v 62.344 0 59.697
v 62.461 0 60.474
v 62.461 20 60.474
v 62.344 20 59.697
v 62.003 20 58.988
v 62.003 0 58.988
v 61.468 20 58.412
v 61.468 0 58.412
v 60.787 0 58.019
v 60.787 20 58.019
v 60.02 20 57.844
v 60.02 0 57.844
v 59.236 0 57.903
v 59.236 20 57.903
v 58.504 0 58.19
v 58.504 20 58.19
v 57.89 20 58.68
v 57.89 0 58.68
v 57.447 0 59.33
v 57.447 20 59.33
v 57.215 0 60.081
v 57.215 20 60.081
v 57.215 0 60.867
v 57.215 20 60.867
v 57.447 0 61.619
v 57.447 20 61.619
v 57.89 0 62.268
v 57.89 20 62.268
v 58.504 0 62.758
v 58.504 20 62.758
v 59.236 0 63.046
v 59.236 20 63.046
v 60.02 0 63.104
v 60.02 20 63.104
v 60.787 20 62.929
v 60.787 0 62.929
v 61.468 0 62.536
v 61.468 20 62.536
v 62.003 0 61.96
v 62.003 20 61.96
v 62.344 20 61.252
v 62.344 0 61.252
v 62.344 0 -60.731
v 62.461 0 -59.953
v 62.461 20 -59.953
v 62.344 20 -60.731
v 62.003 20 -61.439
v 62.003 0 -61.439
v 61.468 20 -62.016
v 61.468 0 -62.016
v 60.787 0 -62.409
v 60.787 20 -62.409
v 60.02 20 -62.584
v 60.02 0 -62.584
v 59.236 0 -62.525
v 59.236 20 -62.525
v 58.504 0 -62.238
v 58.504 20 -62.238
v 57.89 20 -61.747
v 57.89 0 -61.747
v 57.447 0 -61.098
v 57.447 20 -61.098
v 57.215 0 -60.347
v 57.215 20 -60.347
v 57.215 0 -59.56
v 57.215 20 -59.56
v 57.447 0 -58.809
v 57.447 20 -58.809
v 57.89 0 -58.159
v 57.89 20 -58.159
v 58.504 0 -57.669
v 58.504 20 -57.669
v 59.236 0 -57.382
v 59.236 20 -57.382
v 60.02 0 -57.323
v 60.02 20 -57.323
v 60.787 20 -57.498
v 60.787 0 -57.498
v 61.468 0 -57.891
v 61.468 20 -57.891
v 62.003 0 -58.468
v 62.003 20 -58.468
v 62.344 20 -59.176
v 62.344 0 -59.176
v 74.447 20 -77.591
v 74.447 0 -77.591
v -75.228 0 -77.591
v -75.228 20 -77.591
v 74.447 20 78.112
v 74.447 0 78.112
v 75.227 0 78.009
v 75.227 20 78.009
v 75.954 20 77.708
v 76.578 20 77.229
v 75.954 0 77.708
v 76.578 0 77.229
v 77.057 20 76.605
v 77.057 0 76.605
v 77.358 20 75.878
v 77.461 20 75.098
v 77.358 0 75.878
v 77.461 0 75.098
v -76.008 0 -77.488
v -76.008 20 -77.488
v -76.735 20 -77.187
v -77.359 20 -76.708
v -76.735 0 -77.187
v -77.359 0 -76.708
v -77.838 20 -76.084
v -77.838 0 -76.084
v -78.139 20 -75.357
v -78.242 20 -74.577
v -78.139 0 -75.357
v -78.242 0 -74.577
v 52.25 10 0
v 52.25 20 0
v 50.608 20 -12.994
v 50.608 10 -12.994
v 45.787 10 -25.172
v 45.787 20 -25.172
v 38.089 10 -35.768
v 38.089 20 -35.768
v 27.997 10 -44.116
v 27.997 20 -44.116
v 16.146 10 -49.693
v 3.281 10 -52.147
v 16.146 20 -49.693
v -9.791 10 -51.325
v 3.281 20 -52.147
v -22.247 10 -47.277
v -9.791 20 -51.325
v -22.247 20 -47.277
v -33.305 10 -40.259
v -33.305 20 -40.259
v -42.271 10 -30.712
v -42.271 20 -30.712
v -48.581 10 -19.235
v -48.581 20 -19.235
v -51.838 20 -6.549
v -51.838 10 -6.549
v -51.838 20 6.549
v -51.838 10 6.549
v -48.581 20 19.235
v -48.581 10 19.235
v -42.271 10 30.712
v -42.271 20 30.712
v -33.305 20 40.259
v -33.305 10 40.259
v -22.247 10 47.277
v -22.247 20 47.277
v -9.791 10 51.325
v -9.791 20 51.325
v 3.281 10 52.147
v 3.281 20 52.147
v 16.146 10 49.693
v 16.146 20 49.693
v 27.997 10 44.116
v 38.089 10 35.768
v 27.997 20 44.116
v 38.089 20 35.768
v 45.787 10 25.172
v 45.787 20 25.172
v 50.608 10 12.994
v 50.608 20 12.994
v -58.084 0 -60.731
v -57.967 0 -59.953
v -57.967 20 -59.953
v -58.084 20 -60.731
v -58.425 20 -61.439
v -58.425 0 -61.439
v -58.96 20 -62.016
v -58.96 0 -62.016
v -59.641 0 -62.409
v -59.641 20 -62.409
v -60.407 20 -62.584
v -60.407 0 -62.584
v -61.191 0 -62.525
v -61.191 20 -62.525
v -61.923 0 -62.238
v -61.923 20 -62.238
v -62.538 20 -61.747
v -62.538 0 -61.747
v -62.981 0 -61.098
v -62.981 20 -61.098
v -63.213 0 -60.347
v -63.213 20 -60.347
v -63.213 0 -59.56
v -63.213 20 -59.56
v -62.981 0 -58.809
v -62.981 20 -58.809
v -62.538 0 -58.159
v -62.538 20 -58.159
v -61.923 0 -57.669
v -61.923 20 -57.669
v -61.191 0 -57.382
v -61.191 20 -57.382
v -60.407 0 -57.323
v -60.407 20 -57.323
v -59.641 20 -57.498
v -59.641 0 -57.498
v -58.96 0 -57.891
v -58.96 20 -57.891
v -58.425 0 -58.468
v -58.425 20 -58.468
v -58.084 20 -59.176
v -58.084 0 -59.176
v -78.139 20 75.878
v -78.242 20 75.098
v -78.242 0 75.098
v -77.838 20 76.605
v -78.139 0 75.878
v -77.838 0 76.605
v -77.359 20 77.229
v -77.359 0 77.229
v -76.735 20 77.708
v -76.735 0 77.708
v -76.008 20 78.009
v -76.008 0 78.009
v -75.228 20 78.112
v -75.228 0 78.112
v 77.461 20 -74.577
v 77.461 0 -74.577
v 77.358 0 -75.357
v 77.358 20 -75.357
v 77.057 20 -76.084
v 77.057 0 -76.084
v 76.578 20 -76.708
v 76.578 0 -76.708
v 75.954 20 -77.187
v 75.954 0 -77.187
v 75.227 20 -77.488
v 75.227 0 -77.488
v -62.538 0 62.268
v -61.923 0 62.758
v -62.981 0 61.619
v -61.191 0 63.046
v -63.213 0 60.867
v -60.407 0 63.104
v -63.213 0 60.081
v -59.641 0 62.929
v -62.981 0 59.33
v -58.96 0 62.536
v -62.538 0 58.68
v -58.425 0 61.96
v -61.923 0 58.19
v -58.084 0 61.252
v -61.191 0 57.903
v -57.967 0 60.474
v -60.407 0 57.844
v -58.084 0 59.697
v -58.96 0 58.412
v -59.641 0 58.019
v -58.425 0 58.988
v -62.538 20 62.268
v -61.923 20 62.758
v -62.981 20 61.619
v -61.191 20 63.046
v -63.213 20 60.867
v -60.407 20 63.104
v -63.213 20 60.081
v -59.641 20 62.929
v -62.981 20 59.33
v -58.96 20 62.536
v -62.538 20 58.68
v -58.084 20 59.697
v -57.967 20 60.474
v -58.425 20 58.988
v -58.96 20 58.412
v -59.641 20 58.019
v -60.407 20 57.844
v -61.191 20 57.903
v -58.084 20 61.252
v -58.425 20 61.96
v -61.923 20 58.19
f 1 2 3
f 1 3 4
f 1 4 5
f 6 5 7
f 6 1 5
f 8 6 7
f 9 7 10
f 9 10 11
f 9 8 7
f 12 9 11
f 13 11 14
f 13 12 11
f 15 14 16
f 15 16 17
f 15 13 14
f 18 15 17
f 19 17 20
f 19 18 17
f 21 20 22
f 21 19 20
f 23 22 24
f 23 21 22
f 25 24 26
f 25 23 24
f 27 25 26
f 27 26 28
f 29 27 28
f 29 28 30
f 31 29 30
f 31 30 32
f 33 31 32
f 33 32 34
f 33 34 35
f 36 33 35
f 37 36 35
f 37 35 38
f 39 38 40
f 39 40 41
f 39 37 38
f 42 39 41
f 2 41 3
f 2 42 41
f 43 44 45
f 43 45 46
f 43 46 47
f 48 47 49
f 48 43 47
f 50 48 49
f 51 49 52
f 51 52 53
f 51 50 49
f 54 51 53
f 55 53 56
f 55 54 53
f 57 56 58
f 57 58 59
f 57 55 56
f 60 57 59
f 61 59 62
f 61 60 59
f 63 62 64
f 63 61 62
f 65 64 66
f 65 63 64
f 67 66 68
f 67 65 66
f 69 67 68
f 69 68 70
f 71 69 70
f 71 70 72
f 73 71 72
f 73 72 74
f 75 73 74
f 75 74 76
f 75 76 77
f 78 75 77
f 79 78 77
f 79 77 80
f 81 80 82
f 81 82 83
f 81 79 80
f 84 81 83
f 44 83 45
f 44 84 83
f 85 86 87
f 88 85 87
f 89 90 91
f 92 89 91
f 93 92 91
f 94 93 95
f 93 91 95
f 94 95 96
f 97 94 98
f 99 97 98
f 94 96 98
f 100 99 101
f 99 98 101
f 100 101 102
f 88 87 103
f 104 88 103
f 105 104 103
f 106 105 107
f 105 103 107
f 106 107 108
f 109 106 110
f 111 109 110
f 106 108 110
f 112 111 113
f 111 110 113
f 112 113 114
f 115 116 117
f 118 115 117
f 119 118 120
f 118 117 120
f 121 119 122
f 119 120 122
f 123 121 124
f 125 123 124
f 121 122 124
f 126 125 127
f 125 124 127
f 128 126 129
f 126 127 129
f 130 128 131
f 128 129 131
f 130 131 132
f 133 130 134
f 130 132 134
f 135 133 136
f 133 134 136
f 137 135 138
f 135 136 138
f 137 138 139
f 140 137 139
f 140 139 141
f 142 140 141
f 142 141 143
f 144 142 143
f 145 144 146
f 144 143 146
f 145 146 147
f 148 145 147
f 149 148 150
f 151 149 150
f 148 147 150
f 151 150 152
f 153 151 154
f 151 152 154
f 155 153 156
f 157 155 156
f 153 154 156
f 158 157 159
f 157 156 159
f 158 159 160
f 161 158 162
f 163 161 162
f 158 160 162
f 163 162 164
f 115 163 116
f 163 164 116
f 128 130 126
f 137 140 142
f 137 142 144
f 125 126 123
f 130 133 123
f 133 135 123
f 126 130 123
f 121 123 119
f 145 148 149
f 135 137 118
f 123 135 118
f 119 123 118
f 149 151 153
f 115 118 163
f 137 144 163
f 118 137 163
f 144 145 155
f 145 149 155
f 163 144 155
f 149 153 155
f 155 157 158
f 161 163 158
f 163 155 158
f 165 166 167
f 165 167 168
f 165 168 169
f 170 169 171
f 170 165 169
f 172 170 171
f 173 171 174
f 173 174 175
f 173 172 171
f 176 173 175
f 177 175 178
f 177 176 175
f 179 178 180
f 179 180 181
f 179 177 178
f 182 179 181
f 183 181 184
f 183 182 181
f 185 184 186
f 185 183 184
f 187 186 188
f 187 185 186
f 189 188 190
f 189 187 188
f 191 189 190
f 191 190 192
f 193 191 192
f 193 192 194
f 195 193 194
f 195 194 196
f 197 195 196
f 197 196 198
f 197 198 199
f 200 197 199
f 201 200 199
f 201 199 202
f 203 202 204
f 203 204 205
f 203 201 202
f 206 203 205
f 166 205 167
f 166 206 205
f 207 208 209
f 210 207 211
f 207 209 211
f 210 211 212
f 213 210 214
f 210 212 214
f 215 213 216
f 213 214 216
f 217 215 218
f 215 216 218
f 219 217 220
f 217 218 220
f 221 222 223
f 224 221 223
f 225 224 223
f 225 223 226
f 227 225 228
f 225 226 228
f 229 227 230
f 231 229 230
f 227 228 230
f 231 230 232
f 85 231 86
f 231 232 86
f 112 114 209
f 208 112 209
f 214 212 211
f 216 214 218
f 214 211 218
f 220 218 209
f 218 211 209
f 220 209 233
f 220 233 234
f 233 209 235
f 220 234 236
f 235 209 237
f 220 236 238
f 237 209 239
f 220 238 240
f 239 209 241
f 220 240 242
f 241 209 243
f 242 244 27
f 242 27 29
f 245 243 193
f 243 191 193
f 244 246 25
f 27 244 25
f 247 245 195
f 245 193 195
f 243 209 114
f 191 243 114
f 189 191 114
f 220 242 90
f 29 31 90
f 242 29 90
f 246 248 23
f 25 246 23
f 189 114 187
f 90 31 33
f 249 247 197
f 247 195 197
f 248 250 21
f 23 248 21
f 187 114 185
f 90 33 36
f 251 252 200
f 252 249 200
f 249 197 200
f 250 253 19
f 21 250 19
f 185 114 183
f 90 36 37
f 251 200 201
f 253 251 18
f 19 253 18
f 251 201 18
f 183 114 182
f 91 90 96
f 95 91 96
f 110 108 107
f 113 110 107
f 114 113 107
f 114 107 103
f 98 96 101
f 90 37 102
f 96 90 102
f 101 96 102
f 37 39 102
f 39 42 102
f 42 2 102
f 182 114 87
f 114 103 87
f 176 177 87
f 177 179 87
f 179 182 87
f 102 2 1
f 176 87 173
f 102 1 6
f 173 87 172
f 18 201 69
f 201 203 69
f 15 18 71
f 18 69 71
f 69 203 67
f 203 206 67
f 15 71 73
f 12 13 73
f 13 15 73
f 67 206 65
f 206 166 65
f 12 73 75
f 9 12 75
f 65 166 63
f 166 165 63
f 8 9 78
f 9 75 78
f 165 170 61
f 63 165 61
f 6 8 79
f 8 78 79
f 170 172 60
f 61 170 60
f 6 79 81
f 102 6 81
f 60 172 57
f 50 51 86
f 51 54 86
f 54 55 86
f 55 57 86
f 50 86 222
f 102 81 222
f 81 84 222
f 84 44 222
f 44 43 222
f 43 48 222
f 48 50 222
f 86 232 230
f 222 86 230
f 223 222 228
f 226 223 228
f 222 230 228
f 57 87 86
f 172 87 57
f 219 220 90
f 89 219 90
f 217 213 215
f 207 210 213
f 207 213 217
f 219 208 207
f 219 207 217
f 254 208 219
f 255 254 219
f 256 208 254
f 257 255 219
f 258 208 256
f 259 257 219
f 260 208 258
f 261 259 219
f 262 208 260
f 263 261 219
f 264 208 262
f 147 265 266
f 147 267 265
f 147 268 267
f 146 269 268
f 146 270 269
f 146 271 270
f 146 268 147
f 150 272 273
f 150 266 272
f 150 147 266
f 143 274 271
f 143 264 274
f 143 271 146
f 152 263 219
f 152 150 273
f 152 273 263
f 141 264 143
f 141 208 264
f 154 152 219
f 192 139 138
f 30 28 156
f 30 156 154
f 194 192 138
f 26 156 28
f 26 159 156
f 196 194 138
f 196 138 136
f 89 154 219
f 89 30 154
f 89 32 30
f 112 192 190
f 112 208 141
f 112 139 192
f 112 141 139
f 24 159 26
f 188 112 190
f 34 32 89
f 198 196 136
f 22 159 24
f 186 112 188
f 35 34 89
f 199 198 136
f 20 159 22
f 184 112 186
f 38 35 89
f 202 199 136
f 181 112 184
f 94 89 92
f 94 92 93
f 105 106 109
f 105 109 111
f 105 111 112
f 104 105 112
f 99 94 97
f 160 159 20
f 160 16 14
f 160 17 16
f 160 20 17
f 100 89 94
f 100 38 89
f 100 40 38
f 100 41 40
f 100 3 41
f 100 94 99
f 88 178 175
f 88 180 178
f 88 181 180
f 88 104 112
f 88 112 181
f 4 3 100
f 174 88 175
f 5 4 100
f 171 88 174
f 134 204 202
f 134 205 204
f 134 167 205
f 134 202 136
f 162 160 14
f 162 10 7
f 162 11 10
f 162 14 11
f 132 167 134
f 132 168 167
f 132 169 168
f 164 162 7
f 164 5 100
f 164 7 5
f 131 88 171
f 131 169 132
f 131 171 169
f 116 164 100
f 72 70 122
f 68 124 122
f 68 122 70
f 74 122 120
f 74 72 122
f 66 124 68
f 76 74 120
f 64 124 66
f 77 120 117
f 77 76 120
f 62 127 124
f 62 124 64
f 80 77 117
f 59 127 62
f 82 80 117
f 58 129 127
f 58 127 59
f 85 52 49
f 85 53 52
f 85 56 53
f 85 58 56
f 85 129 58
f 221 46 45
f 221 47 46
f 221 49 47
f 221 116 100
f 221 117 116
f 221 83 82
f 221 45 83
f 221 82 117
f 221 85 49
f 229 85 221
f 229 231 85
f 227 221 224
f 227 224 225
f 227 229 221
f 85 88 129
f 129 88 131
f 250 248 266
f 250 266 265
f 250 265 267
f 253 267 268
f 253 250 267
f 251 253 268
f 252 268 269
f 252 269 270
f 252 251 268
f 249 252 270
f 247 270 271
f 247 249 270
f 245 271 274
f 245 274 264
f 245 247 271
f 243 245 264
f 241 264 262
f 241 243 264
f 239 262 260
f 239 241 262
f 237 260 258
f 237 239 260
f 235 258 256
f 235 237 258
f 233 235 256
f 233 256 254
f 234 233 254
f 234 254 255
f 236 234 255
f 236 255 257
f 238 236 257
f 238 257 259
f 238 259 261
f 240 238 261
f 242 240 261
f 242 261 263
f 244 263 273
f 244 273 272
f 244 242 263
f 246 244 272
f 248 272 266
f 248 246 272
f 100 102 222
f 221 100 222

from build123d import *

# Parameters (mm, degrees)
SKETCH1_R           = 2.637642313
SKETCH1_R_2         = 73
BOSS_EXTRUDE1_DEPTH = 20
SKETCH4_R           = 73
SKETCH4_R_2         = 52.25
BOSS_EXTRUDE2_DEPTH = 10
SKETCH5_R           = 73
BOSS_EXTRUDE3_DEPTH = 10


with BuildPart() as part:
    # Sketch1 → Boss-Extrude1 (new body)
    with BuildSketch(Plane(origin=(0, 0, 0), x_dir=(1, 0, 0), z_dir=(0, 1, 0))):
        with BuildLine():
            Line((77.460838348, -75.098177713), (77.460838348, 74.577424045))
            ThreePointArc((77.460838348, 74.577424045), (76.578174547, 76.708362964), (74.447235628, 77.591026765))
            Line((74.447235628, 77.591026765), (-75.22836613, 77.591026765))
            ThreePointArc((-75.22836613, 77.591026765), (-77.359305049, 76.708362964), (-78.24196885, 74.577424045))
            Line((-78.24196885, 74.577424045), (-78.24196885, -75.098177713))
            ThreePointArc((-78.24196885, -75.098177713), (-77.359305049, -77.229116632), (-75.22836613, -78.111780433))
            Line((-75.22836613, -78.111780433), (74.447235628, -78.111780433))
            ThreePointArc((74.447235628, -78.111780433), (76.578174547, -77.229116632), (77.460838348, -75.098177713))
        make_face()
        with Locations((-60.604326536, -60.47413812)):
            Circle(SKETCH1_R, mode=Mode.SUBTRACT)
        with Locations((-60.604326536, 59.953384452)):
            Circle(SKETCH1_R, mode=Mode.SUBTRACT)
        with Locations((59.823196035, 59.953384452)):
            Circle(SKETCH1_R, mode=Mode.SUBTRACT)
        with Locations((59.823196035, -60.47413812)):
            Circle(SKETCH1_R, mode=Mode.SUBTRACT)
        Circle(SKETCH1_R_2, mode=Mode.SUBTRACT)
    extrude(amount=BOSS_EXTRUDE1_DEPTH)

    # Sketch4 → Boss-Extrude2 (add)
    with BuildSketch(Plane(origin=(0, 20, 0), x_dir=(1, 0, 0), z_dir=(0, 1, 0))):
        Circle(SKETCH4_R)
        Circle(SKETCH4_R_2, mode=Mode.SUBTRACT)
    extrude(amount=-BOSS_EXTRUDE2_DEPTH)

    # Sketch5 → Boss-Extrude3 (add)
    with BuildSketch(Plane.XZ.offset(-10)):
        Circle(SKETCH5_R)
    extrude(amount=BOSS_EXTRUDE3_DEPTH)


solid = part.part
